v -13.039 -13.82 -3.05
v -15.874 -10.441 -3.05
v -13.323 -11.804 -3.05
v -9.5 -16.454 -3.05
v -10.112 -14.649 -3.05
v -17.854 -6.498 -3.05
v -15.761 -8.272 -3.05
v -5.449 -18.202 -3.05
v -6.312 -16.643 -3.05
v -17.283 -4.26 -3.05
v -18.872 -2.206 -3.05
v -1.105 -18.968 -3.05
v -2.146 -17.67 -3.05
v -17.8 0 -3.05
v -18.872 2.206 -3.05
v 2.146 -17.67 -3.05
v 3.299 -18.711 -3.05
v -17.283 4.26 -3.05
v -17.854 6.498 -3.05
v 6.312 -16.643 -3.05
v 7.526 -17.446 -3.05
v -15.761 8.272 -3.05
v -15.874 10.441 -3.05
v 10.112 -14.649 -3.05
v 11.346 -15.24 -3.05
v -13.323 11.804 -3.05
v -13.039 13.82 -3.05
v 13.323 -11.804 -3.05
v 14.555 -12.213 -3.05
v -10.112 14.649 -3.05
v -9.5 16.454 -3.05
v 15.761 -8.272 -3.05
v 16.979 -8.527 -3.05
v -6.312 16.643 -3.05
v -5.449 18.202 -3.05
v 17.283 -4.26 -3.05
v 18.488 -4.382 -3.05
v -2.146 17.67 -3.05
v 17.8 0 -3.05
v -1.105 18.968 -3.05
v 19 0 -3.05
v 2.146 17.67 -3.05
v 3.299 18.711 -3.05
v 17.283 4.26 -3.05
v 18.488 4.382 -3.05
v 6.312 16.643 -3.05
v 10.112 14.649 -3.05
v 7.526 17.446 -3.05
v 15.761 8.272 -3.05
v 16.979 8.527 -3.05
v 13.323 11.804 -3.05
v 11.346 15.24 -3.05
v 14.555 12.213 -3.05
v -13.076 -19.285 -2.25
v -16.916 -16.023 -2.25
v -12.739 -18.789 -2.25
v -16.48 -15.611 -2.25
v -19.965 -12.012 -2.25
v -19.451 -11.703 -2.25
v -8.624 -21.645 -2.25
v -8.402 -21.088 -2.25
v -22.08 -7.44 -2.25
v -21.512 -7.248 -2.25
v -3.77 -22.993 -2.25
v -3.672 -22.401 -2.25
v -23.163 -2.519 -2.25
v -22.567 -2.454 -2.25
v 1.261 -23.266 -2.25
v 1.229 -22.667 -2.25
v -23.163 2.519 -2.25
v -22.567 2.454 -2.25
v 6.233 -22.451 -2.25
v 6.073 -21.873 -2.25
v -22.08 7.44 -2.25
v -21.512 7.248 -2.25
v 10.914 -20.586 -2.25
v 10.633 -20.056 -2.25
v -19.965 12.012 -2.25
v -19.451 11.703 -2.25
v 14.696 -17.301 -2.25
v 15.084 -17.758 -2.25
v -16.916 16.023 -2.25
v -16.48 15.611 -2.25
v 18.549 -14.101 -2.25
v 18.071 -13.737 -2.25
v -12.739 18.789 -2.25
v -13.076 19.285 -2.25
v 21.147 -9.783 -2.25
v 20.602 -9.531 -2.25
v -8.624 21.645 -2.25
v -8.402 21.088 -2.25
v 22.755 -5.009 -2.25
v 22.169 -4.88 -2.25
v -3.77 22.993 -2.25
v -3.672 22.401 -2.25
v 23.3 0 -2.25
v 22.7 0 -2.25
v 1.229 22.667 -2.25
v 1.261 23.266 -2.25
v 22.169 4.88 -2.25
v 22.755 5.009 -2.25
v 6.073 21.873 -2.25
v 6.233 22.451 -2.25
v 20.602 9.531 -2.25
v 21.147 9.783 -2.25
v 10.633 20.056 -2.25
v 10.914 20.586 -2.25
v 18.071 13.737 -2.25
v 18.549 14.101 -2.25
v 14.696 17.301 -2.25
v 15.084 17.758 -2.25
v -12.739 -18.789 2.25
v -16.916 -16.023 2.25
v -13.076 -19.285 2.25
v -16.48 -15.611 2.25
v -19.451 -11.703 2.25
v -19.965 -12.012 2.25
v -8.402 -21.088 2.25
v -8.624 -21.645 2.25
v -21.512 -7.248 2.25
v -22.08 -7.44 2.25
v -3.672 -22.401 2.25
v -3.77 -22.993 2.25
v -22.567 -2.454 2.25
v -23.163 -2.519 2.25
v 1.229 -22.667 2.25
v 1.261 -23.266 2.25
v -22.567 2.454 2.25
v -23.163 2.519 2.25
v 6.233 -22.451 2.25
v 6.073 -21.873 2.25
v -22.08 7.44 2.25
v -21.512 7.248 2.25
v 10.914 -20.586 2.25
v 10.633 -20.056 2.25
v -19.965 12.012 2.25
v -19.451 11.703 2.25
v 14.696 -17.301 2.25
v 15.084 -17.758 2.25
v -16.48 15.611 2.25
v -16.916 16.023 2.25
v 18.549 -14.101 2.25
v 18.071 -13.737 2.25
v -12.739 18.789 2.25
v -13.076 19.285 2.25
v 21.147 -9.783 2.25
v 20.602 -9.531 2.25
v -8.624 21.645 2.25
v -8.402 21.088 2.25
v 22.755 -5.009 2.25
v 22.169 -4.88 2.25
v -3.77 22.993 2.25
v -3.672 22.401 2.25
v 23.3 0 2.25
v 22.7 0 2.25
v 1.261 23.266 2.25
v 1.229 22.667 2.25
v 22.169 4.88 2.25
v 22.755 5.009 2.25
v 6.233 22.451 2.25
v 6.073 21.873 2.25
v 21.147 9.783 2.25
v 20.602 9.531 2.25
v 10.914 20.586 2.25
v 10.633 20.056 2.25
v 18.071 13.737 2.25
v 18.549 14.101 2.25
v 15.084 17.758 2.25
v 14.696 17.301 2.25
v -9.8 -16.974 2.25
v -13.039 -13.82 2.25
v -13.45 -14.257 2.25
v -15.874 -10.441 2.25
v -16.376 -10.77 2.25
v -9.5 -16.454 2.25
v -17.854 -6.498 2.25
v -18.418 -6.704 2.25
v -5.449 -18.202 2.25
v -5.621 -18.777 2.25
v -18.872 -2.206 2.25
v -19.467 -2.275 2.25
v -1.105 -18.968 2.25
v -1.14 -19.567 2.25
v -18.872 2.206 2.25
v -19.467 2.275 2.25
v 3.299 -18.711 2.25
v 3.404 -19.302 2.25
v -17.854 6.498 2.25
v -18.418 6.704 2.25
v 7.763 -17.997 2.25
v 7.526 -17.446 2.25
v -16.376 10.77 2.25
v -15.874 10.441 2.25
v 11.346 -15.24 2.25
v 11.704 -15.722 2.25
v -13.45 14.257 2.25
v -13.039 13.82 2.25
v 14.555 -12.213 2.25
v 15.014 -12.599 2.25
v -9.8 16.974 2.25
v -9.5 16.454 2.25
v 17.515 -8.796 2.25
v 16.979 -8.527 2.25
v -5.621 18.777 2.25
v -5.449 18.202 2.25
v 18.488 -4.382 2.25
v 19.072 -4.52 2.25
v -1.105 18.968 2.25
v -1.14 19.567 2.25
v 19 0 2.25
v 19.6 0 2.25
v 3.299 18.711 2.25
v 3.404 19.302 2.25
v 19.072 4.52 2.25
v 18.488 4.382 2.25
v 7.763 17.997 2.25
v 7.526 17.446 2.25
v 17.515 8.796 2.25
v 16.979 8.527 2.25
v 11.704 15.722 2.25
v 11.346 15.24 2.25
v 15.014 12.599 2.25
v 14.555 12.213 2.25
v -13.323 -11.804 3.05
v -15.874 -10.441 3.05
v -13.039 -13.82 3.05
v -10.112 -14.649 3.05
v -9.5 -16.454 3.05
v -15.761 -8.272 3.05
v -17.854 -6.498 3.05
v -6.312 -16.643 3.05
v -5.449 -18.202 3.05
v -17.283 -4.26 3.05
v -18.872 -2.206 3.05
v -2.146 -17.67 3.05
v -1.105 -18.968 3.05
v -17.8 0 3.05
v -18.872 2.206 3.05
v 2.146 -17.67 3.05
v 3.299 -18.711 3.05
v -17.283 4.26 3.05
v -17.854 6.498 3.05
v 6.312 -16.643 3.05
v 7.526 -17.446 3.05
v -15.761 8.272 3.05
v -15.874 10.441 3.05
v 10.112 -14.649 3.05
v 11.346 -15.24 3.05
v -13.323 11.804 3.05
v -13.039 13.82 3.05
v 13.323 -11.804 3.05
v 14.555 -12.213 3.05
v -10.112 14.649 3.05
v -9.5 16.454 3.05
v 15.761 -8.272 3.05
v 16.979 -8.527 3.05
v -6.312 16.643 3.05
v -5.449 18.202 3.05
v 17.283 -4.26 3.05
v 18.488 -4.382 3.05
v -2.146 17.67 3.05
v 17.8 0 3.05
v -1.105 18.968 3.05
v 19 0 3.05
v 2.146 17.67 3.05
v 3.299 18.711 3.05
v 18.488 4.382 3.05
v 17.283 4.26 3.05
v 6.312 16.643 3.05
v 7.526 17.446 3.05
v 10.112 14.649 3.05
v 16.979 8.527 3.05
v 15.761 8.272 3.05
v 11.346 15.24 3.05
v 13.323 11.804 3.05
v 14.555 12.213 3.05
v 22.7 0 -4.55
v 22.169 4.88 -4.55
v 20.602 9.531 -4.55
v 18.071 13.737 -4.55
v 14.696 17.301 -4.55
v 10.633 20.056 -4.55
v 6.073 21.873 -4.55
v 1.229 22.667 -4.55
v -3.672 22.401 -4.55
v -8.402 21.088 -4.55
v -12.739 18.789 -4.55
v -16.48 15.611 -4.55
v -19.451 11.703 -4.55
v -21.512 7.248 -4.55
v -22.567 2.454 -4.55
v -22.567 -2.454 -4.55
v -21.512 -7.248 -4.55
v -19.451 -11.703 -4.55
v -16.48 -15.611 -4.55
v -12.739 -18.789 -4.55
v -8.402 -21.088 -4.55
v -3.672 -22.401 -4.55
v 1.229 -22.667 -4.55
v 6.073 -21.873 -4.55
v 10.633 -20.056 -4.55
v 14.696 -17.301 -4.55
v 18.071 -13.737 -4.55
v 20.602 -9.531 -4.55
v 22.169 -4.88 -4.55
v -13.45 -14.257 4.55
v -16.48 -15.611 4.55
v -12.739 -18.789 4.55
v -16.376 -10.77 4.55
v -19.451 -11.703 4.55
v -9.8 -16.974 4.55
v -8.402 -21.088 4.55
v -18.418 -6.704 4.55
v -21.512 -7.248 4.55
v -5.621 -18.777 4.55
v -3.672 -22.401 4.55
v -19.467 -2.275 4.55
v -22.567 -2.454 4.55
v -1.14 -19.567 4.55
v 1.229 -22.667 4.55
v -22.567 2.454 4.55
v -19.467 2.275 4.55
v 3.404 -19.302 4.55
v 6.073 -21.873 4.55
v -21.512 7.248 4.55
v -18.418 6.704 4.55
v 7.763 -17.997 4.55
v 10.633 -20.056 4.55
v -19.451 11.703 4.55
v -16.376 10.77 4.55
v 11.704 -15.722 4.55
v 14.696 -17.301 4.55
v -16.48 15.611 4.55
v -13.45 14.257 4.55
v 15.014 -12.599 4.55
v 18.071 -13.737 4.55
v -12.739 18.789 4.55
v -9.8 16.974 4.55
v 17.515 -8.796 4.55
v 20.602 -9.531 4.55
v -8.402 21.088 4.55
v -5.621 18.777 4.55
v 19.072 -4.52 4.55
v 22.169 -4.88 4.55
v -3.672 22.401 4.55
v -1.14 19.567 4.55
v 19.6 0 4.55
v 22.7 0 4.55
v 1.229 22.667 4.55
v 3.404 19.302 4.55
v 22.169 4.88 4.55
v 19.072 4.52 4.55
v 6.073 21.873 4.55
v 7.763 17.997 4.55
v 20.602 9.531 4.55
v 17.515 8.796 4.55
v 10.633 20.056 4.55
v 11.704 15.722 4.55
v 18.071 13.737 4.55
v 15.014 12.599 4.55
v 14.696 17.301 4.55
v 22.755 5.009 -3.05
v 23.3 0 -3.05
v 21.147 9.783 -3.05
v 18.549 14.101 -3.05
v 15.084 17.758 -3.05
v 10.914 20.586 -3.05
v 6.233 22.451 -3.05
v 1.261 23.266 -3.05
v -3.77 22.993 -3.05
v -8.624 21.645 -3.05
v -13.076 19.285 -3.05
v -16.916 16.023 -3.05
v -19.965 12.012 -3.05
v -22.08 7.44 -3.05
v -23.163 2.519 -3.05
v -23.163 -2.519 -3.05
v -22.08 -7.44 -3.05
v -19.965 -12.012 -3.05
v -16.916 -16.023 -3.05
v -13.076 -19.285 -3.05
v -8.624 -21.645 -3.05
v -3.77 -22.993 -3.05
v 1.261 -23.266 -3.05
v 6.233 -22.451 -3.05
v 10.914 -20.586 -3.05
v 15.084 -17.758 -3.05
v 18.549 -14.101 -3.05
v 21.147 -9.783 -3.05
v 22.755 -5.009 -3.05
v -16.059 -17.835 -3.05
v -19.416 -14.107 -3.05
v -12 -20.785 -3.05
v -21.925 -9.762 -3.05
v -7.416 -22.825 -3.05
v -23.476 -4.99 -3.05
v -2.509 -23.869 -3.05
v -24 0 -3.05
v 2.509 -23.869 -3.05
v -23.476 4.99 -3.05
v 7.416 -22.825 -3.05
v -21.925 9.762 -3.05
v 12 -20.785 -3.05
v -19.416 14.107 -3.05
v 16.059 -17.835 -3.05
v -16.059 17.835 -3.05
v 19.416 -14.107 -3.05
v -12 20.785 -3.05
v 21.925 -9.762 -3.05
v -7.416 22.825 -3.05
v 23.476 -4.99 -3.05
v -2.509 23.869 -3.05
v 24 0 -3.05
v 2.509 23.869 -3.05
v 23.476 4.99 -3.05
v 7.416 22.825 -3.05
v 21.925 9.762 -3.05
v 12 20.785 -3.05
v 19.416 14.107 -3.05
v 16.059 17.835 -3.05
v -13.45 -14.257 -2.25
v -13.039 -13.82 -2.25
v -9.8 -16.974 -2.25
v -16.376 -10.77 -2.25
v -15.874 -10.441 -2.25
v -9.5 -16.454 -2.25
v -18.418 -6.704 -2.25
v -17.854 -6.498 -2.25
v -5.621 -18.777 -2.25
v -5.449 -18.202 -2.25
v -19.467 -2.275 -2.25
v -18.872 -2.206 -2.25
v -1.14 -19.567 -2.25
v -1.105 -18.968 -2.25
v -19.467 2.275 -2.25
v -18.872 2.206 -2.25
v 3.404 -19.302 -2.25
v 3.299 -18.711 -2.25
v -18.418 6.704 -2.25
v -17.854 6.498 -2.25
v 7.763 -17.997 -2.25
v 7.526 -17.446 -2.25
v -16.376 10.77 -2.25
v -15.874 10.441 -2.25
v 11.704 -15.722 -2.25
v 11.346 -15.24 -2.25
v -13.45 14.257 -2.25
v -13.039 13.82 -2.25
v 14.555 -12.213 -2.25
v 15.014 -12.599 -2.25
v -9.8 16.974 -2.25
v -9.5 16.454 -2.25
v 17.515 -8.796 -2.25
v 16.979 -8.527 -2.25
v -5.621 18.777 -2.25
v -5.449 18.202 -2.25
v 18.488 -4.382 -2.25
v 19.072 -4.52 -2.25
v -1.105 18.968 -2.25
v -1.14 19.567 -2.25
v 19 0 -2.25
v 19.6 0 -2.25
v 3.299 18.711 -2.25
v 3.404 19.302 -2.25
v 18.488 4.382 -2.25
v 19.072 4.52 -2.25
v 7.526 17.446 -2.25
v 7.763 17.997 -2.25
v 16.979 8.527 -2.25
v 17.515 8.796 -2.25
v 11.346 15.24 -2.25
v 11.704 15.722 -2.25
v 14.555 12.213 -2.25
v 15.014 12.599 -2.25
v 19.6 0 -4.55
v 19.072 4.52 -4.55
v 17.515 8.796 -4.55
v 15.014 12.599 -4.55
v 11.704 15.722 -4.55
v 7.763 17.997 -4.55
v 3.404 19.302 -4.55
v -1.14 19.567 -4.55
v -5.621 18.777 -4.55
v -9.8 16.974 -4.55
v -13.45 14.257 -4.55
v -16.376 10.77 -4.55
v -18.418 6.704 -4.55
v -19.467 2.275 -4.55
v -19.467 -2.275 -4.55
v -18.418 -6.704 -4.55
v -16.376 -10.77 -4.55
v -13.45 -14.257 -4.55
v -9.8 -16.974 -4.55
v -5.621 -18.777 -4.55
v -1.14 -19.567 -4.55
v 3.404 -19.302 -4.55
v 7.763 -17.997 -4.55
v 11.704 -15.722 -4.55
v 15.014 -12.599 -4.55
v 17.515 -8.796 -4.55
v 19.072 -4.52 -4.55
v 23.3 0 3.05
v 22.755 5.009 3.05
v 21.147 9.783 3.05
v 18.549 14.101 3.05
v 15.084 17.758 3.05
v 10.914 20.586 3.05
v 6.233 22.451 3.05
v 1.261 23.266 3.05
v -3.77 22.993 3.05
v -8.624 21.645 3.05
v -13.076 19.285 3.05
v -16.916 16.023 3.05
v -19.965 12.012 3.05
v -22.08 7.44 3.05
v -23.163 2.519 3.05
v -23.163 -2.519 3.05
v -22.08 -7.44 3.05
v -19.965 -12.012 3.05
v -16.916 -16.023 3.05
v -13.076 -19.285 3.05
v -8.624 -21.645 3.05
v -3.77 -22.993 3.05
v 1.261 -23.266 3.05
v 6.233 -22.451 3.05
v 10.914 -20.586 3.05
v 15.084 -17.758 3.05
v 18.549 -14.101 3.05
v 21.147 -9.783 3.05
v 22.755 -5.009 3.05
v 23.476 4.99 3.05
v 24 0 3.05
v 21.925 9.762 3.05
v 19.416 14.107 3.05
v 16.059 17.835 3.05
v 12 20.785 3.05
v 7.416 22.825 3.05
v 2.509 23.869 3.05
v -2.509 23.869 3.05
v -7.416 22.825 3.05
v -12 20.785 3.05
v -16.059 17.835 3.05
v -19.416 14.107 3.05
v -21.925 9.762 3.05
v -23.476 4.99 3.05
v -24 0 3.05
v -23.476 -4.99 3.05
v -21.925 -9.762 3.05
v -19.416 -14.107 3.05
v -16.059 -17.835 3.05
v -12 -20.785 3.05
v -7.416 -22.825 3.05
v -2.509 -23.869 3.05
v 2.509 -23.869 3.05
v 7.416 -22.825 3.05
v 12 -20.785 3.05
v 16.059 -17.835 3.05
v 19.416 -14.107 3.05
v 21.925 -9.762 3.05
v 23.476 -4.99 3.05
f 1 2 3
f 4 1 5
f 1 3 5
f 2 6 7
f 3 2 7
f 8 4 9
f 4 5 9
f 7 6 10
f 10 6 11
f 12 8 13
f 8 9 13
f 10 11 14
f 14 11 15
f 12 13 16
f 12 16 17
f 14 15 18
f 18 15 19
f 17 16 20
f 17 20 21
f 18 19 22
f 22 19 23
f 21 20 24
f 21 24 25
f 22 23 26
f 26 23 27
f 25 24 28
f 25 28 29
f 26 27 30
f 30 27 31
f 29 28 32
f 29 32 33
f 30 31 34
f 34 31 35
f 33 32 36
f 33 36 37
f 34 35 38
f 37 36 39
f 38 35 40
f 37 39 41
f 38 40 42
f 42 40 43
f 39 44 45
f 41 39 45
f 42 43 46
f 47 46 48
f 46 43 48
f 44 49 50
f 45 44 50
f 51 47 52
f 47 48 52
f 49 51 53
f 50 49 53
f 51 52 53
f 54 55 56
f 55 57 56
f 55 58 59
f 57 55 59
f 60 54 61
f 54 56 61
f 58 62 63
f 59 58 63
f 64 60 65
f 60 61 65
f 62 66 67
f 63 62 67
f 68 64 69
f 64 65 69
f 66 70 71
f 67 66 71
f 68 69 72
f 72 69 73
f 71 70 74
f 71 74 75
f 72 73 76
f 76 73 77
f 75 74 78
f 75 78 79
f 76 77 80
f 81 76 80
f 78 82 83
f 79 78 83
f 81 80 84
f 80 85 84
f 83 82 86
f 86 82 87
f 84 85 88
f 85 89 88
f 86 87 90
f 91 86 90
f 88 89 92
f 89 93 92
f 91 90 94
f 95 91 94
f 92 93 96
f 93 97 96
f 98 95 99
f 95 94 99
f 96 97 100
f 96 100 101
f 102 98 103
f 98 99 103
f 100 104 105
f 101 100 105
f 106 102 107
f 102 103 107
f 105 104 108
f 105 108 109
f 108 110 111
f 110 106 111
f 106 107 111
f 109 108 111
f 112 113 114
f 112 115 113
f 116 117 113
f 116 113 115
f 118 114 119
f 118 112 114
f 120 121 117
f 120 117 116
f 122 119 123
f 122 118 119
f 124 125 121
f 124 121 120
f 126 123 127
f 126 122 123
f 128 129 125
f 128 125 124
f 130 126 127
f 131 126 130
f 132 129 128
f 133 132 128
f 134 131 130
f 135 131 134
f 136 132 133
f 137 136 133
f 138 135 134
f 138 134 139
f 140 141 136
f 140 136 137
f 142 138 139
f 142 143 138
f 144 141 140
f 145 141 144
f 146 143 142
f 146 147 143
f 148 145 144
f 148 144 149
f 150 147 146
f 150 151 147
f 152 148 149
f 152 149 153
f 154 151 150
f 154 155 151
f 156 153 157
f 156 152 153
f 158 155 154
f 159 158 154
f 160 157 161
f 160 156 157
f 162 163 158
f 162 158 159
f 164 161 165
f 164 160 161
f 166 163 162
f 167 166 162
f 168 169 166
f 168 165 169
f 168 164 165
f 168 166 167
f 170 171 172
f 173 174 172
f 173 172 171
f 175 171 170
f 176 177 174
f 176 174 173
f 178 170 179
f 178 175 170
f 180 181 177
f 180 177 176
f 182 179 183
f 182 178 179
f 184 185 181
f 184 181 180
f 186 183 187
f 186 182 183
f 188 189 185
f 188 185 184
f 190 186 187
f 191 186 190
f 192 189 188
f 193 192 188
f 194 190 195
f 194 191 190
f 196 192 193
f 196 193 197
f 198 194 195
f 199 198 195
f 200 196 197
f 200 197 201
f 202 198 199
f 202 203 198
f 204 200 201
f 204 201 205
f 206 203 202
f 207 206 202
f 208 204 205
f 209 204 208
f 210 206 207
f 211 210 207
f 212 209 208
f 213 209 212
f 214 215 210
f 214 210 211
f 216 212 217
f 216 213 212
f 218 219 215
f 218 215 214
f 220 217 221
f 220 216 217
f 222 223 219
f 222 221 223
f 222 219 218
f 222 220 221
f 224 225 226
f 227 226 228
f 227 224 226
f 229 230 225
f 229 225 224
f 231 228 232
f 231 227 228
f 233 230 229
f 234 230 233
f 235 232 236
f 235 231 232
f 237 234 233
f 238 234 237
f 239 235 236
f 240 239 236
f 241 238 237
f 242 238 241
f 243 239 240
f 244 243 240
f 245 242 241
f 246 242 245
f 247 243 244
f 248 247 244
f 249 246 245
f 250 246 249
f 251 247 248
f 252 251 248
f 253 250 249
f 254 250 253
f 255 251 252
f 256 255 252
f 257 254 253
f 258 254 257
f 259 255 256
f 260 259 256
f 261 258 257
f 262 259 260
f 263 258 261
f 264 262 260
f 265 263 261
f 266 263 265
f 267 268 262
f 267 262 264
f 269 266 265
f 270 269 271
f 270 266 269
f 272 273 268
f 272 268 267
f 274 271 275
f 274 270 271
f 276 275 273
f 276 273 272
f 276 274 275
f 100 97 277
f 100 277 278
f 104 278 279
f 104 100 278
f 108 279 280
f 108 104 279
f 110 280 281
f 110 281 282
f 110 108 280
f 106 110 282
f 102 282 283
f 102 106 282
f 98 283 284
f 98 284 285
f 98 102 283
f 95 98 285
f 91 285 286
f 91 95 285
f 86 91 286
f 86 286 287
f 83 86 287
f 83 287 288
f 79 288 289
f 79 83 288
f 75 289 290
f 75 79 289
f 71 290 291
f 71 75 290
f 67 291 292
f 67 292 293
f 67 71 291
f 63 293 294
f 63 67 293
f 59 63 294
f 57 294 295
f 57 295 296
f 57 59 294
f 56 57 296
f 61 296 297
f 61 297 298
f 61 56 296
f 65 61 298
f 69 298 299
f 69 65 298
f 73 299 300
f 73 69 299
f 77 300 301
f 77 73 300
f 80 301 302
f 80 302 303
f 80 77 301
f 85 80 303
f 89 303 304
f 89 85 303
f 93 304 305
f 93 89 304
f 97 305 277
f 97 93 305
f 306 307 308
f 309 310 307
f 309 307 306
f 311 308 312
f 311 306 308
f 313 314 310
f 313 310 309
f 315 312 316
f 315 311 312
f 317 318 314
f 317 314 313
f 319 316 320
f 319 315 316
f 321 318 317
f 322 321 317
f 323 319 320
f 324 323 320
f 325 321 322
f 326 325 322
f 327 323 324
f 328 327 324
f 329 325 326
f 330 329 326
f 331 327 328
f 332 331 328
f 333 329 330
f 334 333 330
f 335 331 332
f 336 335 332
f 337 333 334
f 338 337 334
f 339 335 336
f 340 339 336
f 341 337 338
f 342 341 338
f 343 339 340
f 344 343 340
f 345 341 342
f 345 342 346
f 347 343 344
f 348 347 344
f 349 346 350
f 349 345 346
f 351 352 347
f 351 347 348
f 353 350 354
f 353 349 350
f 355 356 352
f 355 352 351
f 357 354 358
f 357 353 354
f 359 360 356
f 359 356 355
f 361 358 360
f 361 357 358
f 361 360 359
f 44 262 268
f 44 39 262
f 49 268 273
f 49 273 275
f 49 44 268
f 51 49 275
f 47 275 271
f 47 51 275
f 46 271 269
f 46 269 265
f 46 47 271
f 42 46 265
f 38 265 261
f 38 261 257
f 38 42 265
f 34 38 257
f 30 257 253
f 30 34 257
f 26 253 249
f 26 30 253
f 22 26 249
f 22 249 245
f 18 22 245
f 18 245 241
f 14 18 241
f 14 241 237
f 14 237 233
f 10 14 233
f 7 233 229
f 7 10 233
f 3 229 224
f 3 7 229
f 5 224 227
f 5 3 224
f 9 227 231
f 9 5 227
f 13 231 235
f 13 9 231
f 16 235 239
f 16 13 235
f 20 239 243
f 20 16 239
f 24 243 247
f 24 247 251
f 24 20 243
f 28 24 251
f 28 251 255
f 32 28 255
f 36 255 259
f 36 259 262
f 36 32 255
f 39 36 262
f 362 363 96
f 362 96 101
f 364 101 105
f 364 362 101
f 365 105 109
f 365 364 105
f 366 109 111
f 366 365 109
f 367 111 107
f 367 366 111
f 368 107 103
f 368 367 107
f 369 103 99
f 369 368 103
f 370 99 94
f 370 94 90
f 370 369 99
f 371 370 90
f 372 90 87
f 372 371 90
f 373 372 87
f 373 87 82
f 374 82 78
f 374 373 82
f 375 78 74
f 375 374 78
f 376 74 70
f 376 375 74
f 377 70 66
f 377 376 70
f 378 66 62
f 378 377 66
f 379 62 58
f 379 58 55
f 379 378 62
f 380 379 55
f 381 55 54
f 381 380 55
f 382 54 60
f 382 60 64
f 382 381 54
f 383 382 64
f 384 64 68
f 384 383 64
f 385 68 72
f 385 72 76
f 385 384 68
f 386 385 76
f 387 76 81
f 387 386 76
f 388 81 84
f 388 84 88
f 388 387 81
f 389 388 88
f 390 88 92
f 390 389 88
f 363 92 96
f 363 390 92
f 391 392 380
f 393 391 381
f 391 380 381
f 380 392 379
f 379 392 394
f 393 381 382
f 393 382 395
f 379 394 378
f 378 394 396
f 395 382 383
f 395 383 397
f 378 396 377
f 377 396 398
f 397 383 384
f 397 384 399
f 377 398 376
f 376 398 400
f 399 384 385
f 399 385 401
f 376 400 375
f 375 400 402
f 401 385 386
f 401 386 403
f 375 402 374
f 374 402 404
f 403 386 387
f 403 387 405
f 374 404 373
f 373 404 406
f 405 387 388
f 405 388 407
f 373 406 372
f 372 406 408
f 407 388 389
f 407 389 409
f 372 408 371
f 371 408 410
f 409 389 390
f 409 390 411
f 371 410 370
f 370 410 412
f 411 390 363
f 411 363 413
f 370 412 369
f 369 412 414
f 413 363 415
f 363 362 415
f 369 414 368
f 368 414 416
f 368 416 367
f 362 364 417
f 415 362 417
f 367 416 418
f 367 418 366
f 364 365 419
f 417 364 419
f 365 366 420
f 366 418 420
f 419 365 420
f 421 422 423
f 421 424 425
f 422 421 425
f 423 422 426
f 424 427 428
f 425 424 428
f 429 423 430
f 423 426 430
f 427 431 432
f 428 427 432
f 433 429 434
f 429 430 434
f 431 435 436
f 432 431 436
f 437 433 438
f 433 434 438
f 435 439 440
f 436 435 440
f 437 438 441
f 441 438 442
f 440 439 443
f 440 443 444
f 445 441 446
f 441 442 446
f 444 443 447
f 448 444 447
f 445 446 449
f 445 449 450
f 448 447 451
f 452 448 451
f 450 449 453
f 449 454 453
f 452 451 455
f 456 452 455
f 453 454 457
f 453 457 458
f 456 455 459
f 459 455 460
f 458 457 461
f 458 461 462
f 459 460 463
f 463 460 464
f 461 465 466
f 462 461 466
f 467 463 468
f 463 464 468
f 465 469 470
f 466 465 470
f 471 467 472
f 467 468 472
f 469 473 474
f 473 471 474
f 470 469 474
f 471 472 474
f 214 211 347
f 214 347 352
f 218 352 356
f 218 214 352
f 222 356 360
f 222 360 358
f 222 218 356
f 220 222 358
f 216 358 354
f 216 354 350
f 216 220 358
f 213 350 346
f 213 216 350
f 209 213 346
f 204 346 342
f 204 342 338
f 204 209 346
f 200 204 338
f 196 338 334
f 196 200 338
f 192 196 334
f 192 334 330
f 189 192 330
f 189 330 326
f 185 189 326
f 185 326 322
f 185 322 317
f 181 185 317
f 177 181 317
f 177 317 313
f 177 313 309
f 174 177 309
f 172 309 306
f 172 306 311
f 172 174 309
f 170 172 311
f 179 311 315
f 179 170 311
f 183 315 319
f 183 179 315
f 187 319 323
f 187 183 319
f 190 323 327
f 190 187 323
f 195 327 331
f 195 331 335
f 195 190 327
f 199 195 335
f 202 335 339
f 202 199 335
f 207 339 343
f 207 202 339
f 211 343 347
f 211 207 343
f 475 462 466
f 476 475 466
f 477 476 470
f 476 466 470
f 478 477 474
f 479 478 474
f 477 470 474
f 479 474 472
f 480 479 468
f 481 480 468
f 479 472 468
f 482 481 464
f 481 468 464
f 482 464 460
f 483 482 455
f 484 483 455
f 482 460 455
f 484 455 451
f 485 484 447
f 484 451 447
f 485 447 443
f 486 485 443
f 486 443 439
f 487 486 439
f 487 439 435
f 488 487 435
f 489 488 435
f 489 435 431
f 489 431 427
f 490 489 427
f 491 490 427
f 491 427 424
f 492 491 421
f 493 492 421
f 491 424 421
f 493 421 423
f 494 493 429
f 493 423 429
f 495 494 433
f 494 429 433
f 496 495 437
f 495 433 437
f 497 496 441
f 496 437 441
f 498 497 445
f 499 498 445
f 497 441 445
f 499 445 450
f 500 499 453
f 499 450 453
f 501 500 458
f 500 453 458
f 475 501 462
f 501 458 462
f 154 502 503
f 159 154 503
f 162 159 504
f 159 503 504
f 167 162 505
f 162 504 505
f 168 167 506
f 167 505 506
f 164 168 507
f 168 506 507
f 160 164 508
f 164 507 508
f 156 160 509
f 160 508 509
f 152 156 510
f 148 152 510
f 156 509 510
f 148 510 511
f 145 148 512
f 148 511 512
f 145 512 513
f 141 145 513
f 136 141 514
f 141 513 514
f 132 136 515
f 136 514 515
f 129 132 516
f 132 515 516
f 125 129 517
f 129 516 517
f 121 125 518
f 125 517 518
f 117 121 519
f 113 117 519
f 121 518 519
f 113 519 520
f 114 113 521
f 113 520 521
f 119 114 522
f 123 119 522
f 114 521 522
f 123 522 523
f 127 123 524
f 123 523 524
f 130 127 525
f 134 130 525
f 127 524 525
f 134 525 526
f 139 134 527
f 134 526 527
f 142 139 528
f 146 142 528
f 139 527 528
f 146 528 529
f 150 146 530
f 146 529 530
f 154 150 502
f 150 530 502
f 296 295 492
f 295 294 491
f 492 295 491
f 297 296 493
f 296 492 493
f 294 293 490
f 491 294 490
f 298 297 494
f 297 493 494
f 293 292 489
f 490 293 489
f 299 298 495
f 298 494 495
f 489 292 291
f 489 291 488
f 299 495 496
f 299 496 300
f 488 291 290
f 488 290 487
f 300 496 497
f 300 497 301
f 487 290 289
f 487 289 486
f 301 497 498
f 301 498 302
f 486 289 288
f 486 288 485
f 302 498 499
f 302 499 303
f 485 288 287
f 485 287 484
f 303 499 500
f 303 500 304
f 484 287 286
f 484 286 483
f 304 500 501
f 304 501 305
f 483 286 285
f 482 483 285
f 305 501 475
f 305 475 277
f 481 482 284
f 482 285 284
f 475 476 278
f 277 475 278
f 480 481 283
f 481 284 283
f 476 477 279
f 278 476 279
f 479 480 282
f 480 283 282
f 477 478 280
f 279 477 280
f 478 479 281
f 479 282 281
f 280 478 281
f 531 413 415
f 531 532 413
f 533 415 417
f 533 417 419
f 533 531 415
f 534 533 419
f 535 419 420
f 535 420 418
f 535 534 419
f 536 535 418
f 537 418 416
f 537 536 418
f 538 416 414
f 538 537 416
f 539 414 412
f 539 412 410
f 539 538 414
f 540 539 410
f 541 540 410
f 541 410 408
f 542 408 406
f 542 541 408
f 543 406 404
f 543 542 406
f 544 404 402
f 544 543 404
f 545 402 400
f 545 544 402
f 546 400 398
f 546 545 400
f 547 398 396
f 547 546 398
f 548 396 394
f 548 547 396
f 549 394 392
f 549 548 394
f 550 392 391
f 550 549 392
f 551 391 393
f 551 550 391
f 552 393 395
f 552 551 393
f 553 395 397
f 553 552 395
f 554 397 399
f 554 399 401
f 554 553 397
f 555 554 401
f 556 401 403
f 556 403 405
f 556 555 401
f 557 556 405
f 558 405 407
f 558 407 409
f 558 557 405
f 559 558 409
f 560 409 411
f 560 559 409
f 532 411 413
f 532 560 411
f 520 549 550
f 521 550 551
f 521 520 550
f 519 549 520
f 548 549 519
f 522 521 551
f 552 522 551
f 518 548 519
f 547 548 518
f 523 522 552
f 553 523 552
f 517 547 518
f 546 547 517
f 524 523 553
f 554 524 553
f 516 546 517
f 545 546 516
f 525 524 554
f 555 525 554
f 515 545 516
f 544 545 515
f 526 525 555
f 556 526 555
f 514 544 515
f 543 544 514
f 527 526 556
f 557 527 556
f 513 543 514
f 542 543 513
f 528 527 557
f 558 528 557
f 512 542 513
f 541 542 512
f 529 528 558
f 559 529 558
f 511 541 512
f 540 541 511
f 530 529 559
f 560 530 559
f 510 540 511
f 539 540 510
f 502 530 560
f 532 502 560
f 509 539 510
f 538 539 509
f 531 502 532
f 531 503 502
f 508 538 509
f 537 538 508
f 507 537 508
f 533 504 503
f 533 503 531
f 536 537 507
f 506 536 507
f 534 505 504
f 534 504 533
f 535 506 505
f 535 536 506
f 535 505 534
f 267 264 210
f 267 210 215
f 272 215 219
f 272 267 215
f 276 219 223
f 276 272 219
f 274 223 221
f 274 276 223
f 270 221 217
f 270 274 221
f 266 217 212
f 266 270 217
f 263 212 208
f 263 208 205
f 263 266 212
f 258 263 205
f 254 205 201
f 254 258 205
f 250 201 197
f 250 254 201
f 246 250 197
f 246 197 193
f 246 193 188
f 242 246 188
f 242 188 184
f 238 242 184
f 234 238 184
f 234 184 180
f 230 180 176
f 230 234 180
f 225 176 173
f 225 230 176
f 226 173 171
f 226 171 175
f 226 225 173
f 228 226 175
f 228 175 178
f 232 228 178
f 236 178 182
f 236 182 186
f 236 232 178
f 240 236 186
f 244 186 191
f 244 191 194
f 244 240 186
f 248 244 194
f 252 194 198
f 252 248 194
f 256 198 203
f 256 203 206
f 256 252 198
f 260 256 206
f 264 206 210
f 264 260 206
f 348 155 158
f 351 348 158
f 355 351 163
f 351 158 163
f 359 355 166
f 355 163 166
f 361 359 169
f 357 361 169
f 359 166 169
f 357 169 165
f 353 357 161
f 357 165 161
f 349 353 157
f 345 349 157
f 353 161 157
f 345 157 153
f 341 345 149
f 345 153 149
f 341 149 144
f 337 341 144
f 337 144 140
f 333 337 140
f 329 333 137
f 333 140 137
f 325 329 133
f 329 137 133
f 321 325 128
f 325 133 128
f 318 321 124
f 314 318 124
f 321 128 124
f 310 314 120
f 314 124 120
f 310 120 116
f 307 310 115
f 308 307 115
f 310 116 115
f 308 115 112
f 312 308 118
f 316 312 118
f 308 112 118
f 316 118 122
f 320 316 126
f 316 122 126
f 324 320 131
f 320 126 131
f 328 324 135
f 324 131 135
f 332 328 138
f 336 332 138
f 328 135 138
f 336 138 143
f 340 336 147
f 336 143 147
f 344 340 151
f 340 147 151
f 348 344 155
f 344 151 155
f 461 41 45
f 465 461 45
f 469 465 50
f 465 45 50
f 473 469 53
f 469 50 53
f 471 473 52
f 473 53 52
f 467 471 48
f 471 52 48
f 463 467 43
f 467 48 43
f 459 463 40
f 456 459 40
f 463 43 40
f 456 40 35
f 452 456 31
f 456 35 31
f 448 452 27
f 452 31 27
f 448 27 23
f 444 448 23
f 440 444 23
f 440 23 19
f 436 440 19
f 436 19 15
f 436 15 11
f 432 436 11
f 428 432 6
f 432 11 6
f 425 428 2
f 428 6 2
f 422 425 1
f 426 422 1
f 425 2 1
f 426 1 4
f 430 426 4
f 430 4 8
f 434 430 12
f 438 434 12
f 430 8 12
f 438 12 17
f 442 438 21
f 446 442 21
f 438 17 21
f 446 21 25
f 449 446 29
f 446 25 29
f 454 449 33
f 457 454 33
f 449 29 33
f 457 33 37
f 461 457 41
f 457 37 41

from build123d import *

# Parameters (mm, degrees)
SKETCH1_R           = 24
SKETCH1_R_2         = 17.8
BOSS_EXTRUDE1_DEPTH = 3.05
SKETCH2_R           = 23.3
SKETCH2_R_2         = 19
CUT_EXTRUDE1_DEPTH  = 0.8
SKETCH3_R           = 22.7
SKETCH3_R_2         = 19.6
BOSS_EXTRUDE2_DEPTH = 2.3


with BuildPart() as part:
    # Sketch1 → Boss-Extrude1 (new, symmetric)
    with BuildSketch(Plane.XY):
        Circle(SKETCH1_R)
        Circle(SKETCH1_R_2, mode=Mode.SUBTRACT)
    extrude(amount=BOSS_EXTRUDE1_DEPTH, both=True)

    # Sketch2 → Cut-Extrude1 (cut)
    with BuildSketch(Plane.XY.offset(3.05)):
        Circle(SKETCH2_R)
        Circle(SKETCH2_R_2, mode=Mode.SUBTRACT)
    cut_extrude1 = extrude(amount=-CUT_EXTRUDE1_DEPTH, mode=Mode.SUBTRACT)

    # Sketch3 → Boss-Extrude2 (add)
    with BuildSketch(Plane.XY.offset(2.25)):
        Circle(SKETCH3_R)
        Circle(SKETCH3_R_2, mode=Mode.SUBTRACT)
    boss_extrude2 = extrude(amount=BOSS_EXTRUDE2_DEPTH)

    # Mirror1: Cut-Extrude1, Boss-Extrude2 across plane
    add(cut_extrude1.mirror(Plane.XY), mode=Mode.SUBTRACT)
    add(boss_extrude2.mirror(Plane.XY))


solid = part.part
